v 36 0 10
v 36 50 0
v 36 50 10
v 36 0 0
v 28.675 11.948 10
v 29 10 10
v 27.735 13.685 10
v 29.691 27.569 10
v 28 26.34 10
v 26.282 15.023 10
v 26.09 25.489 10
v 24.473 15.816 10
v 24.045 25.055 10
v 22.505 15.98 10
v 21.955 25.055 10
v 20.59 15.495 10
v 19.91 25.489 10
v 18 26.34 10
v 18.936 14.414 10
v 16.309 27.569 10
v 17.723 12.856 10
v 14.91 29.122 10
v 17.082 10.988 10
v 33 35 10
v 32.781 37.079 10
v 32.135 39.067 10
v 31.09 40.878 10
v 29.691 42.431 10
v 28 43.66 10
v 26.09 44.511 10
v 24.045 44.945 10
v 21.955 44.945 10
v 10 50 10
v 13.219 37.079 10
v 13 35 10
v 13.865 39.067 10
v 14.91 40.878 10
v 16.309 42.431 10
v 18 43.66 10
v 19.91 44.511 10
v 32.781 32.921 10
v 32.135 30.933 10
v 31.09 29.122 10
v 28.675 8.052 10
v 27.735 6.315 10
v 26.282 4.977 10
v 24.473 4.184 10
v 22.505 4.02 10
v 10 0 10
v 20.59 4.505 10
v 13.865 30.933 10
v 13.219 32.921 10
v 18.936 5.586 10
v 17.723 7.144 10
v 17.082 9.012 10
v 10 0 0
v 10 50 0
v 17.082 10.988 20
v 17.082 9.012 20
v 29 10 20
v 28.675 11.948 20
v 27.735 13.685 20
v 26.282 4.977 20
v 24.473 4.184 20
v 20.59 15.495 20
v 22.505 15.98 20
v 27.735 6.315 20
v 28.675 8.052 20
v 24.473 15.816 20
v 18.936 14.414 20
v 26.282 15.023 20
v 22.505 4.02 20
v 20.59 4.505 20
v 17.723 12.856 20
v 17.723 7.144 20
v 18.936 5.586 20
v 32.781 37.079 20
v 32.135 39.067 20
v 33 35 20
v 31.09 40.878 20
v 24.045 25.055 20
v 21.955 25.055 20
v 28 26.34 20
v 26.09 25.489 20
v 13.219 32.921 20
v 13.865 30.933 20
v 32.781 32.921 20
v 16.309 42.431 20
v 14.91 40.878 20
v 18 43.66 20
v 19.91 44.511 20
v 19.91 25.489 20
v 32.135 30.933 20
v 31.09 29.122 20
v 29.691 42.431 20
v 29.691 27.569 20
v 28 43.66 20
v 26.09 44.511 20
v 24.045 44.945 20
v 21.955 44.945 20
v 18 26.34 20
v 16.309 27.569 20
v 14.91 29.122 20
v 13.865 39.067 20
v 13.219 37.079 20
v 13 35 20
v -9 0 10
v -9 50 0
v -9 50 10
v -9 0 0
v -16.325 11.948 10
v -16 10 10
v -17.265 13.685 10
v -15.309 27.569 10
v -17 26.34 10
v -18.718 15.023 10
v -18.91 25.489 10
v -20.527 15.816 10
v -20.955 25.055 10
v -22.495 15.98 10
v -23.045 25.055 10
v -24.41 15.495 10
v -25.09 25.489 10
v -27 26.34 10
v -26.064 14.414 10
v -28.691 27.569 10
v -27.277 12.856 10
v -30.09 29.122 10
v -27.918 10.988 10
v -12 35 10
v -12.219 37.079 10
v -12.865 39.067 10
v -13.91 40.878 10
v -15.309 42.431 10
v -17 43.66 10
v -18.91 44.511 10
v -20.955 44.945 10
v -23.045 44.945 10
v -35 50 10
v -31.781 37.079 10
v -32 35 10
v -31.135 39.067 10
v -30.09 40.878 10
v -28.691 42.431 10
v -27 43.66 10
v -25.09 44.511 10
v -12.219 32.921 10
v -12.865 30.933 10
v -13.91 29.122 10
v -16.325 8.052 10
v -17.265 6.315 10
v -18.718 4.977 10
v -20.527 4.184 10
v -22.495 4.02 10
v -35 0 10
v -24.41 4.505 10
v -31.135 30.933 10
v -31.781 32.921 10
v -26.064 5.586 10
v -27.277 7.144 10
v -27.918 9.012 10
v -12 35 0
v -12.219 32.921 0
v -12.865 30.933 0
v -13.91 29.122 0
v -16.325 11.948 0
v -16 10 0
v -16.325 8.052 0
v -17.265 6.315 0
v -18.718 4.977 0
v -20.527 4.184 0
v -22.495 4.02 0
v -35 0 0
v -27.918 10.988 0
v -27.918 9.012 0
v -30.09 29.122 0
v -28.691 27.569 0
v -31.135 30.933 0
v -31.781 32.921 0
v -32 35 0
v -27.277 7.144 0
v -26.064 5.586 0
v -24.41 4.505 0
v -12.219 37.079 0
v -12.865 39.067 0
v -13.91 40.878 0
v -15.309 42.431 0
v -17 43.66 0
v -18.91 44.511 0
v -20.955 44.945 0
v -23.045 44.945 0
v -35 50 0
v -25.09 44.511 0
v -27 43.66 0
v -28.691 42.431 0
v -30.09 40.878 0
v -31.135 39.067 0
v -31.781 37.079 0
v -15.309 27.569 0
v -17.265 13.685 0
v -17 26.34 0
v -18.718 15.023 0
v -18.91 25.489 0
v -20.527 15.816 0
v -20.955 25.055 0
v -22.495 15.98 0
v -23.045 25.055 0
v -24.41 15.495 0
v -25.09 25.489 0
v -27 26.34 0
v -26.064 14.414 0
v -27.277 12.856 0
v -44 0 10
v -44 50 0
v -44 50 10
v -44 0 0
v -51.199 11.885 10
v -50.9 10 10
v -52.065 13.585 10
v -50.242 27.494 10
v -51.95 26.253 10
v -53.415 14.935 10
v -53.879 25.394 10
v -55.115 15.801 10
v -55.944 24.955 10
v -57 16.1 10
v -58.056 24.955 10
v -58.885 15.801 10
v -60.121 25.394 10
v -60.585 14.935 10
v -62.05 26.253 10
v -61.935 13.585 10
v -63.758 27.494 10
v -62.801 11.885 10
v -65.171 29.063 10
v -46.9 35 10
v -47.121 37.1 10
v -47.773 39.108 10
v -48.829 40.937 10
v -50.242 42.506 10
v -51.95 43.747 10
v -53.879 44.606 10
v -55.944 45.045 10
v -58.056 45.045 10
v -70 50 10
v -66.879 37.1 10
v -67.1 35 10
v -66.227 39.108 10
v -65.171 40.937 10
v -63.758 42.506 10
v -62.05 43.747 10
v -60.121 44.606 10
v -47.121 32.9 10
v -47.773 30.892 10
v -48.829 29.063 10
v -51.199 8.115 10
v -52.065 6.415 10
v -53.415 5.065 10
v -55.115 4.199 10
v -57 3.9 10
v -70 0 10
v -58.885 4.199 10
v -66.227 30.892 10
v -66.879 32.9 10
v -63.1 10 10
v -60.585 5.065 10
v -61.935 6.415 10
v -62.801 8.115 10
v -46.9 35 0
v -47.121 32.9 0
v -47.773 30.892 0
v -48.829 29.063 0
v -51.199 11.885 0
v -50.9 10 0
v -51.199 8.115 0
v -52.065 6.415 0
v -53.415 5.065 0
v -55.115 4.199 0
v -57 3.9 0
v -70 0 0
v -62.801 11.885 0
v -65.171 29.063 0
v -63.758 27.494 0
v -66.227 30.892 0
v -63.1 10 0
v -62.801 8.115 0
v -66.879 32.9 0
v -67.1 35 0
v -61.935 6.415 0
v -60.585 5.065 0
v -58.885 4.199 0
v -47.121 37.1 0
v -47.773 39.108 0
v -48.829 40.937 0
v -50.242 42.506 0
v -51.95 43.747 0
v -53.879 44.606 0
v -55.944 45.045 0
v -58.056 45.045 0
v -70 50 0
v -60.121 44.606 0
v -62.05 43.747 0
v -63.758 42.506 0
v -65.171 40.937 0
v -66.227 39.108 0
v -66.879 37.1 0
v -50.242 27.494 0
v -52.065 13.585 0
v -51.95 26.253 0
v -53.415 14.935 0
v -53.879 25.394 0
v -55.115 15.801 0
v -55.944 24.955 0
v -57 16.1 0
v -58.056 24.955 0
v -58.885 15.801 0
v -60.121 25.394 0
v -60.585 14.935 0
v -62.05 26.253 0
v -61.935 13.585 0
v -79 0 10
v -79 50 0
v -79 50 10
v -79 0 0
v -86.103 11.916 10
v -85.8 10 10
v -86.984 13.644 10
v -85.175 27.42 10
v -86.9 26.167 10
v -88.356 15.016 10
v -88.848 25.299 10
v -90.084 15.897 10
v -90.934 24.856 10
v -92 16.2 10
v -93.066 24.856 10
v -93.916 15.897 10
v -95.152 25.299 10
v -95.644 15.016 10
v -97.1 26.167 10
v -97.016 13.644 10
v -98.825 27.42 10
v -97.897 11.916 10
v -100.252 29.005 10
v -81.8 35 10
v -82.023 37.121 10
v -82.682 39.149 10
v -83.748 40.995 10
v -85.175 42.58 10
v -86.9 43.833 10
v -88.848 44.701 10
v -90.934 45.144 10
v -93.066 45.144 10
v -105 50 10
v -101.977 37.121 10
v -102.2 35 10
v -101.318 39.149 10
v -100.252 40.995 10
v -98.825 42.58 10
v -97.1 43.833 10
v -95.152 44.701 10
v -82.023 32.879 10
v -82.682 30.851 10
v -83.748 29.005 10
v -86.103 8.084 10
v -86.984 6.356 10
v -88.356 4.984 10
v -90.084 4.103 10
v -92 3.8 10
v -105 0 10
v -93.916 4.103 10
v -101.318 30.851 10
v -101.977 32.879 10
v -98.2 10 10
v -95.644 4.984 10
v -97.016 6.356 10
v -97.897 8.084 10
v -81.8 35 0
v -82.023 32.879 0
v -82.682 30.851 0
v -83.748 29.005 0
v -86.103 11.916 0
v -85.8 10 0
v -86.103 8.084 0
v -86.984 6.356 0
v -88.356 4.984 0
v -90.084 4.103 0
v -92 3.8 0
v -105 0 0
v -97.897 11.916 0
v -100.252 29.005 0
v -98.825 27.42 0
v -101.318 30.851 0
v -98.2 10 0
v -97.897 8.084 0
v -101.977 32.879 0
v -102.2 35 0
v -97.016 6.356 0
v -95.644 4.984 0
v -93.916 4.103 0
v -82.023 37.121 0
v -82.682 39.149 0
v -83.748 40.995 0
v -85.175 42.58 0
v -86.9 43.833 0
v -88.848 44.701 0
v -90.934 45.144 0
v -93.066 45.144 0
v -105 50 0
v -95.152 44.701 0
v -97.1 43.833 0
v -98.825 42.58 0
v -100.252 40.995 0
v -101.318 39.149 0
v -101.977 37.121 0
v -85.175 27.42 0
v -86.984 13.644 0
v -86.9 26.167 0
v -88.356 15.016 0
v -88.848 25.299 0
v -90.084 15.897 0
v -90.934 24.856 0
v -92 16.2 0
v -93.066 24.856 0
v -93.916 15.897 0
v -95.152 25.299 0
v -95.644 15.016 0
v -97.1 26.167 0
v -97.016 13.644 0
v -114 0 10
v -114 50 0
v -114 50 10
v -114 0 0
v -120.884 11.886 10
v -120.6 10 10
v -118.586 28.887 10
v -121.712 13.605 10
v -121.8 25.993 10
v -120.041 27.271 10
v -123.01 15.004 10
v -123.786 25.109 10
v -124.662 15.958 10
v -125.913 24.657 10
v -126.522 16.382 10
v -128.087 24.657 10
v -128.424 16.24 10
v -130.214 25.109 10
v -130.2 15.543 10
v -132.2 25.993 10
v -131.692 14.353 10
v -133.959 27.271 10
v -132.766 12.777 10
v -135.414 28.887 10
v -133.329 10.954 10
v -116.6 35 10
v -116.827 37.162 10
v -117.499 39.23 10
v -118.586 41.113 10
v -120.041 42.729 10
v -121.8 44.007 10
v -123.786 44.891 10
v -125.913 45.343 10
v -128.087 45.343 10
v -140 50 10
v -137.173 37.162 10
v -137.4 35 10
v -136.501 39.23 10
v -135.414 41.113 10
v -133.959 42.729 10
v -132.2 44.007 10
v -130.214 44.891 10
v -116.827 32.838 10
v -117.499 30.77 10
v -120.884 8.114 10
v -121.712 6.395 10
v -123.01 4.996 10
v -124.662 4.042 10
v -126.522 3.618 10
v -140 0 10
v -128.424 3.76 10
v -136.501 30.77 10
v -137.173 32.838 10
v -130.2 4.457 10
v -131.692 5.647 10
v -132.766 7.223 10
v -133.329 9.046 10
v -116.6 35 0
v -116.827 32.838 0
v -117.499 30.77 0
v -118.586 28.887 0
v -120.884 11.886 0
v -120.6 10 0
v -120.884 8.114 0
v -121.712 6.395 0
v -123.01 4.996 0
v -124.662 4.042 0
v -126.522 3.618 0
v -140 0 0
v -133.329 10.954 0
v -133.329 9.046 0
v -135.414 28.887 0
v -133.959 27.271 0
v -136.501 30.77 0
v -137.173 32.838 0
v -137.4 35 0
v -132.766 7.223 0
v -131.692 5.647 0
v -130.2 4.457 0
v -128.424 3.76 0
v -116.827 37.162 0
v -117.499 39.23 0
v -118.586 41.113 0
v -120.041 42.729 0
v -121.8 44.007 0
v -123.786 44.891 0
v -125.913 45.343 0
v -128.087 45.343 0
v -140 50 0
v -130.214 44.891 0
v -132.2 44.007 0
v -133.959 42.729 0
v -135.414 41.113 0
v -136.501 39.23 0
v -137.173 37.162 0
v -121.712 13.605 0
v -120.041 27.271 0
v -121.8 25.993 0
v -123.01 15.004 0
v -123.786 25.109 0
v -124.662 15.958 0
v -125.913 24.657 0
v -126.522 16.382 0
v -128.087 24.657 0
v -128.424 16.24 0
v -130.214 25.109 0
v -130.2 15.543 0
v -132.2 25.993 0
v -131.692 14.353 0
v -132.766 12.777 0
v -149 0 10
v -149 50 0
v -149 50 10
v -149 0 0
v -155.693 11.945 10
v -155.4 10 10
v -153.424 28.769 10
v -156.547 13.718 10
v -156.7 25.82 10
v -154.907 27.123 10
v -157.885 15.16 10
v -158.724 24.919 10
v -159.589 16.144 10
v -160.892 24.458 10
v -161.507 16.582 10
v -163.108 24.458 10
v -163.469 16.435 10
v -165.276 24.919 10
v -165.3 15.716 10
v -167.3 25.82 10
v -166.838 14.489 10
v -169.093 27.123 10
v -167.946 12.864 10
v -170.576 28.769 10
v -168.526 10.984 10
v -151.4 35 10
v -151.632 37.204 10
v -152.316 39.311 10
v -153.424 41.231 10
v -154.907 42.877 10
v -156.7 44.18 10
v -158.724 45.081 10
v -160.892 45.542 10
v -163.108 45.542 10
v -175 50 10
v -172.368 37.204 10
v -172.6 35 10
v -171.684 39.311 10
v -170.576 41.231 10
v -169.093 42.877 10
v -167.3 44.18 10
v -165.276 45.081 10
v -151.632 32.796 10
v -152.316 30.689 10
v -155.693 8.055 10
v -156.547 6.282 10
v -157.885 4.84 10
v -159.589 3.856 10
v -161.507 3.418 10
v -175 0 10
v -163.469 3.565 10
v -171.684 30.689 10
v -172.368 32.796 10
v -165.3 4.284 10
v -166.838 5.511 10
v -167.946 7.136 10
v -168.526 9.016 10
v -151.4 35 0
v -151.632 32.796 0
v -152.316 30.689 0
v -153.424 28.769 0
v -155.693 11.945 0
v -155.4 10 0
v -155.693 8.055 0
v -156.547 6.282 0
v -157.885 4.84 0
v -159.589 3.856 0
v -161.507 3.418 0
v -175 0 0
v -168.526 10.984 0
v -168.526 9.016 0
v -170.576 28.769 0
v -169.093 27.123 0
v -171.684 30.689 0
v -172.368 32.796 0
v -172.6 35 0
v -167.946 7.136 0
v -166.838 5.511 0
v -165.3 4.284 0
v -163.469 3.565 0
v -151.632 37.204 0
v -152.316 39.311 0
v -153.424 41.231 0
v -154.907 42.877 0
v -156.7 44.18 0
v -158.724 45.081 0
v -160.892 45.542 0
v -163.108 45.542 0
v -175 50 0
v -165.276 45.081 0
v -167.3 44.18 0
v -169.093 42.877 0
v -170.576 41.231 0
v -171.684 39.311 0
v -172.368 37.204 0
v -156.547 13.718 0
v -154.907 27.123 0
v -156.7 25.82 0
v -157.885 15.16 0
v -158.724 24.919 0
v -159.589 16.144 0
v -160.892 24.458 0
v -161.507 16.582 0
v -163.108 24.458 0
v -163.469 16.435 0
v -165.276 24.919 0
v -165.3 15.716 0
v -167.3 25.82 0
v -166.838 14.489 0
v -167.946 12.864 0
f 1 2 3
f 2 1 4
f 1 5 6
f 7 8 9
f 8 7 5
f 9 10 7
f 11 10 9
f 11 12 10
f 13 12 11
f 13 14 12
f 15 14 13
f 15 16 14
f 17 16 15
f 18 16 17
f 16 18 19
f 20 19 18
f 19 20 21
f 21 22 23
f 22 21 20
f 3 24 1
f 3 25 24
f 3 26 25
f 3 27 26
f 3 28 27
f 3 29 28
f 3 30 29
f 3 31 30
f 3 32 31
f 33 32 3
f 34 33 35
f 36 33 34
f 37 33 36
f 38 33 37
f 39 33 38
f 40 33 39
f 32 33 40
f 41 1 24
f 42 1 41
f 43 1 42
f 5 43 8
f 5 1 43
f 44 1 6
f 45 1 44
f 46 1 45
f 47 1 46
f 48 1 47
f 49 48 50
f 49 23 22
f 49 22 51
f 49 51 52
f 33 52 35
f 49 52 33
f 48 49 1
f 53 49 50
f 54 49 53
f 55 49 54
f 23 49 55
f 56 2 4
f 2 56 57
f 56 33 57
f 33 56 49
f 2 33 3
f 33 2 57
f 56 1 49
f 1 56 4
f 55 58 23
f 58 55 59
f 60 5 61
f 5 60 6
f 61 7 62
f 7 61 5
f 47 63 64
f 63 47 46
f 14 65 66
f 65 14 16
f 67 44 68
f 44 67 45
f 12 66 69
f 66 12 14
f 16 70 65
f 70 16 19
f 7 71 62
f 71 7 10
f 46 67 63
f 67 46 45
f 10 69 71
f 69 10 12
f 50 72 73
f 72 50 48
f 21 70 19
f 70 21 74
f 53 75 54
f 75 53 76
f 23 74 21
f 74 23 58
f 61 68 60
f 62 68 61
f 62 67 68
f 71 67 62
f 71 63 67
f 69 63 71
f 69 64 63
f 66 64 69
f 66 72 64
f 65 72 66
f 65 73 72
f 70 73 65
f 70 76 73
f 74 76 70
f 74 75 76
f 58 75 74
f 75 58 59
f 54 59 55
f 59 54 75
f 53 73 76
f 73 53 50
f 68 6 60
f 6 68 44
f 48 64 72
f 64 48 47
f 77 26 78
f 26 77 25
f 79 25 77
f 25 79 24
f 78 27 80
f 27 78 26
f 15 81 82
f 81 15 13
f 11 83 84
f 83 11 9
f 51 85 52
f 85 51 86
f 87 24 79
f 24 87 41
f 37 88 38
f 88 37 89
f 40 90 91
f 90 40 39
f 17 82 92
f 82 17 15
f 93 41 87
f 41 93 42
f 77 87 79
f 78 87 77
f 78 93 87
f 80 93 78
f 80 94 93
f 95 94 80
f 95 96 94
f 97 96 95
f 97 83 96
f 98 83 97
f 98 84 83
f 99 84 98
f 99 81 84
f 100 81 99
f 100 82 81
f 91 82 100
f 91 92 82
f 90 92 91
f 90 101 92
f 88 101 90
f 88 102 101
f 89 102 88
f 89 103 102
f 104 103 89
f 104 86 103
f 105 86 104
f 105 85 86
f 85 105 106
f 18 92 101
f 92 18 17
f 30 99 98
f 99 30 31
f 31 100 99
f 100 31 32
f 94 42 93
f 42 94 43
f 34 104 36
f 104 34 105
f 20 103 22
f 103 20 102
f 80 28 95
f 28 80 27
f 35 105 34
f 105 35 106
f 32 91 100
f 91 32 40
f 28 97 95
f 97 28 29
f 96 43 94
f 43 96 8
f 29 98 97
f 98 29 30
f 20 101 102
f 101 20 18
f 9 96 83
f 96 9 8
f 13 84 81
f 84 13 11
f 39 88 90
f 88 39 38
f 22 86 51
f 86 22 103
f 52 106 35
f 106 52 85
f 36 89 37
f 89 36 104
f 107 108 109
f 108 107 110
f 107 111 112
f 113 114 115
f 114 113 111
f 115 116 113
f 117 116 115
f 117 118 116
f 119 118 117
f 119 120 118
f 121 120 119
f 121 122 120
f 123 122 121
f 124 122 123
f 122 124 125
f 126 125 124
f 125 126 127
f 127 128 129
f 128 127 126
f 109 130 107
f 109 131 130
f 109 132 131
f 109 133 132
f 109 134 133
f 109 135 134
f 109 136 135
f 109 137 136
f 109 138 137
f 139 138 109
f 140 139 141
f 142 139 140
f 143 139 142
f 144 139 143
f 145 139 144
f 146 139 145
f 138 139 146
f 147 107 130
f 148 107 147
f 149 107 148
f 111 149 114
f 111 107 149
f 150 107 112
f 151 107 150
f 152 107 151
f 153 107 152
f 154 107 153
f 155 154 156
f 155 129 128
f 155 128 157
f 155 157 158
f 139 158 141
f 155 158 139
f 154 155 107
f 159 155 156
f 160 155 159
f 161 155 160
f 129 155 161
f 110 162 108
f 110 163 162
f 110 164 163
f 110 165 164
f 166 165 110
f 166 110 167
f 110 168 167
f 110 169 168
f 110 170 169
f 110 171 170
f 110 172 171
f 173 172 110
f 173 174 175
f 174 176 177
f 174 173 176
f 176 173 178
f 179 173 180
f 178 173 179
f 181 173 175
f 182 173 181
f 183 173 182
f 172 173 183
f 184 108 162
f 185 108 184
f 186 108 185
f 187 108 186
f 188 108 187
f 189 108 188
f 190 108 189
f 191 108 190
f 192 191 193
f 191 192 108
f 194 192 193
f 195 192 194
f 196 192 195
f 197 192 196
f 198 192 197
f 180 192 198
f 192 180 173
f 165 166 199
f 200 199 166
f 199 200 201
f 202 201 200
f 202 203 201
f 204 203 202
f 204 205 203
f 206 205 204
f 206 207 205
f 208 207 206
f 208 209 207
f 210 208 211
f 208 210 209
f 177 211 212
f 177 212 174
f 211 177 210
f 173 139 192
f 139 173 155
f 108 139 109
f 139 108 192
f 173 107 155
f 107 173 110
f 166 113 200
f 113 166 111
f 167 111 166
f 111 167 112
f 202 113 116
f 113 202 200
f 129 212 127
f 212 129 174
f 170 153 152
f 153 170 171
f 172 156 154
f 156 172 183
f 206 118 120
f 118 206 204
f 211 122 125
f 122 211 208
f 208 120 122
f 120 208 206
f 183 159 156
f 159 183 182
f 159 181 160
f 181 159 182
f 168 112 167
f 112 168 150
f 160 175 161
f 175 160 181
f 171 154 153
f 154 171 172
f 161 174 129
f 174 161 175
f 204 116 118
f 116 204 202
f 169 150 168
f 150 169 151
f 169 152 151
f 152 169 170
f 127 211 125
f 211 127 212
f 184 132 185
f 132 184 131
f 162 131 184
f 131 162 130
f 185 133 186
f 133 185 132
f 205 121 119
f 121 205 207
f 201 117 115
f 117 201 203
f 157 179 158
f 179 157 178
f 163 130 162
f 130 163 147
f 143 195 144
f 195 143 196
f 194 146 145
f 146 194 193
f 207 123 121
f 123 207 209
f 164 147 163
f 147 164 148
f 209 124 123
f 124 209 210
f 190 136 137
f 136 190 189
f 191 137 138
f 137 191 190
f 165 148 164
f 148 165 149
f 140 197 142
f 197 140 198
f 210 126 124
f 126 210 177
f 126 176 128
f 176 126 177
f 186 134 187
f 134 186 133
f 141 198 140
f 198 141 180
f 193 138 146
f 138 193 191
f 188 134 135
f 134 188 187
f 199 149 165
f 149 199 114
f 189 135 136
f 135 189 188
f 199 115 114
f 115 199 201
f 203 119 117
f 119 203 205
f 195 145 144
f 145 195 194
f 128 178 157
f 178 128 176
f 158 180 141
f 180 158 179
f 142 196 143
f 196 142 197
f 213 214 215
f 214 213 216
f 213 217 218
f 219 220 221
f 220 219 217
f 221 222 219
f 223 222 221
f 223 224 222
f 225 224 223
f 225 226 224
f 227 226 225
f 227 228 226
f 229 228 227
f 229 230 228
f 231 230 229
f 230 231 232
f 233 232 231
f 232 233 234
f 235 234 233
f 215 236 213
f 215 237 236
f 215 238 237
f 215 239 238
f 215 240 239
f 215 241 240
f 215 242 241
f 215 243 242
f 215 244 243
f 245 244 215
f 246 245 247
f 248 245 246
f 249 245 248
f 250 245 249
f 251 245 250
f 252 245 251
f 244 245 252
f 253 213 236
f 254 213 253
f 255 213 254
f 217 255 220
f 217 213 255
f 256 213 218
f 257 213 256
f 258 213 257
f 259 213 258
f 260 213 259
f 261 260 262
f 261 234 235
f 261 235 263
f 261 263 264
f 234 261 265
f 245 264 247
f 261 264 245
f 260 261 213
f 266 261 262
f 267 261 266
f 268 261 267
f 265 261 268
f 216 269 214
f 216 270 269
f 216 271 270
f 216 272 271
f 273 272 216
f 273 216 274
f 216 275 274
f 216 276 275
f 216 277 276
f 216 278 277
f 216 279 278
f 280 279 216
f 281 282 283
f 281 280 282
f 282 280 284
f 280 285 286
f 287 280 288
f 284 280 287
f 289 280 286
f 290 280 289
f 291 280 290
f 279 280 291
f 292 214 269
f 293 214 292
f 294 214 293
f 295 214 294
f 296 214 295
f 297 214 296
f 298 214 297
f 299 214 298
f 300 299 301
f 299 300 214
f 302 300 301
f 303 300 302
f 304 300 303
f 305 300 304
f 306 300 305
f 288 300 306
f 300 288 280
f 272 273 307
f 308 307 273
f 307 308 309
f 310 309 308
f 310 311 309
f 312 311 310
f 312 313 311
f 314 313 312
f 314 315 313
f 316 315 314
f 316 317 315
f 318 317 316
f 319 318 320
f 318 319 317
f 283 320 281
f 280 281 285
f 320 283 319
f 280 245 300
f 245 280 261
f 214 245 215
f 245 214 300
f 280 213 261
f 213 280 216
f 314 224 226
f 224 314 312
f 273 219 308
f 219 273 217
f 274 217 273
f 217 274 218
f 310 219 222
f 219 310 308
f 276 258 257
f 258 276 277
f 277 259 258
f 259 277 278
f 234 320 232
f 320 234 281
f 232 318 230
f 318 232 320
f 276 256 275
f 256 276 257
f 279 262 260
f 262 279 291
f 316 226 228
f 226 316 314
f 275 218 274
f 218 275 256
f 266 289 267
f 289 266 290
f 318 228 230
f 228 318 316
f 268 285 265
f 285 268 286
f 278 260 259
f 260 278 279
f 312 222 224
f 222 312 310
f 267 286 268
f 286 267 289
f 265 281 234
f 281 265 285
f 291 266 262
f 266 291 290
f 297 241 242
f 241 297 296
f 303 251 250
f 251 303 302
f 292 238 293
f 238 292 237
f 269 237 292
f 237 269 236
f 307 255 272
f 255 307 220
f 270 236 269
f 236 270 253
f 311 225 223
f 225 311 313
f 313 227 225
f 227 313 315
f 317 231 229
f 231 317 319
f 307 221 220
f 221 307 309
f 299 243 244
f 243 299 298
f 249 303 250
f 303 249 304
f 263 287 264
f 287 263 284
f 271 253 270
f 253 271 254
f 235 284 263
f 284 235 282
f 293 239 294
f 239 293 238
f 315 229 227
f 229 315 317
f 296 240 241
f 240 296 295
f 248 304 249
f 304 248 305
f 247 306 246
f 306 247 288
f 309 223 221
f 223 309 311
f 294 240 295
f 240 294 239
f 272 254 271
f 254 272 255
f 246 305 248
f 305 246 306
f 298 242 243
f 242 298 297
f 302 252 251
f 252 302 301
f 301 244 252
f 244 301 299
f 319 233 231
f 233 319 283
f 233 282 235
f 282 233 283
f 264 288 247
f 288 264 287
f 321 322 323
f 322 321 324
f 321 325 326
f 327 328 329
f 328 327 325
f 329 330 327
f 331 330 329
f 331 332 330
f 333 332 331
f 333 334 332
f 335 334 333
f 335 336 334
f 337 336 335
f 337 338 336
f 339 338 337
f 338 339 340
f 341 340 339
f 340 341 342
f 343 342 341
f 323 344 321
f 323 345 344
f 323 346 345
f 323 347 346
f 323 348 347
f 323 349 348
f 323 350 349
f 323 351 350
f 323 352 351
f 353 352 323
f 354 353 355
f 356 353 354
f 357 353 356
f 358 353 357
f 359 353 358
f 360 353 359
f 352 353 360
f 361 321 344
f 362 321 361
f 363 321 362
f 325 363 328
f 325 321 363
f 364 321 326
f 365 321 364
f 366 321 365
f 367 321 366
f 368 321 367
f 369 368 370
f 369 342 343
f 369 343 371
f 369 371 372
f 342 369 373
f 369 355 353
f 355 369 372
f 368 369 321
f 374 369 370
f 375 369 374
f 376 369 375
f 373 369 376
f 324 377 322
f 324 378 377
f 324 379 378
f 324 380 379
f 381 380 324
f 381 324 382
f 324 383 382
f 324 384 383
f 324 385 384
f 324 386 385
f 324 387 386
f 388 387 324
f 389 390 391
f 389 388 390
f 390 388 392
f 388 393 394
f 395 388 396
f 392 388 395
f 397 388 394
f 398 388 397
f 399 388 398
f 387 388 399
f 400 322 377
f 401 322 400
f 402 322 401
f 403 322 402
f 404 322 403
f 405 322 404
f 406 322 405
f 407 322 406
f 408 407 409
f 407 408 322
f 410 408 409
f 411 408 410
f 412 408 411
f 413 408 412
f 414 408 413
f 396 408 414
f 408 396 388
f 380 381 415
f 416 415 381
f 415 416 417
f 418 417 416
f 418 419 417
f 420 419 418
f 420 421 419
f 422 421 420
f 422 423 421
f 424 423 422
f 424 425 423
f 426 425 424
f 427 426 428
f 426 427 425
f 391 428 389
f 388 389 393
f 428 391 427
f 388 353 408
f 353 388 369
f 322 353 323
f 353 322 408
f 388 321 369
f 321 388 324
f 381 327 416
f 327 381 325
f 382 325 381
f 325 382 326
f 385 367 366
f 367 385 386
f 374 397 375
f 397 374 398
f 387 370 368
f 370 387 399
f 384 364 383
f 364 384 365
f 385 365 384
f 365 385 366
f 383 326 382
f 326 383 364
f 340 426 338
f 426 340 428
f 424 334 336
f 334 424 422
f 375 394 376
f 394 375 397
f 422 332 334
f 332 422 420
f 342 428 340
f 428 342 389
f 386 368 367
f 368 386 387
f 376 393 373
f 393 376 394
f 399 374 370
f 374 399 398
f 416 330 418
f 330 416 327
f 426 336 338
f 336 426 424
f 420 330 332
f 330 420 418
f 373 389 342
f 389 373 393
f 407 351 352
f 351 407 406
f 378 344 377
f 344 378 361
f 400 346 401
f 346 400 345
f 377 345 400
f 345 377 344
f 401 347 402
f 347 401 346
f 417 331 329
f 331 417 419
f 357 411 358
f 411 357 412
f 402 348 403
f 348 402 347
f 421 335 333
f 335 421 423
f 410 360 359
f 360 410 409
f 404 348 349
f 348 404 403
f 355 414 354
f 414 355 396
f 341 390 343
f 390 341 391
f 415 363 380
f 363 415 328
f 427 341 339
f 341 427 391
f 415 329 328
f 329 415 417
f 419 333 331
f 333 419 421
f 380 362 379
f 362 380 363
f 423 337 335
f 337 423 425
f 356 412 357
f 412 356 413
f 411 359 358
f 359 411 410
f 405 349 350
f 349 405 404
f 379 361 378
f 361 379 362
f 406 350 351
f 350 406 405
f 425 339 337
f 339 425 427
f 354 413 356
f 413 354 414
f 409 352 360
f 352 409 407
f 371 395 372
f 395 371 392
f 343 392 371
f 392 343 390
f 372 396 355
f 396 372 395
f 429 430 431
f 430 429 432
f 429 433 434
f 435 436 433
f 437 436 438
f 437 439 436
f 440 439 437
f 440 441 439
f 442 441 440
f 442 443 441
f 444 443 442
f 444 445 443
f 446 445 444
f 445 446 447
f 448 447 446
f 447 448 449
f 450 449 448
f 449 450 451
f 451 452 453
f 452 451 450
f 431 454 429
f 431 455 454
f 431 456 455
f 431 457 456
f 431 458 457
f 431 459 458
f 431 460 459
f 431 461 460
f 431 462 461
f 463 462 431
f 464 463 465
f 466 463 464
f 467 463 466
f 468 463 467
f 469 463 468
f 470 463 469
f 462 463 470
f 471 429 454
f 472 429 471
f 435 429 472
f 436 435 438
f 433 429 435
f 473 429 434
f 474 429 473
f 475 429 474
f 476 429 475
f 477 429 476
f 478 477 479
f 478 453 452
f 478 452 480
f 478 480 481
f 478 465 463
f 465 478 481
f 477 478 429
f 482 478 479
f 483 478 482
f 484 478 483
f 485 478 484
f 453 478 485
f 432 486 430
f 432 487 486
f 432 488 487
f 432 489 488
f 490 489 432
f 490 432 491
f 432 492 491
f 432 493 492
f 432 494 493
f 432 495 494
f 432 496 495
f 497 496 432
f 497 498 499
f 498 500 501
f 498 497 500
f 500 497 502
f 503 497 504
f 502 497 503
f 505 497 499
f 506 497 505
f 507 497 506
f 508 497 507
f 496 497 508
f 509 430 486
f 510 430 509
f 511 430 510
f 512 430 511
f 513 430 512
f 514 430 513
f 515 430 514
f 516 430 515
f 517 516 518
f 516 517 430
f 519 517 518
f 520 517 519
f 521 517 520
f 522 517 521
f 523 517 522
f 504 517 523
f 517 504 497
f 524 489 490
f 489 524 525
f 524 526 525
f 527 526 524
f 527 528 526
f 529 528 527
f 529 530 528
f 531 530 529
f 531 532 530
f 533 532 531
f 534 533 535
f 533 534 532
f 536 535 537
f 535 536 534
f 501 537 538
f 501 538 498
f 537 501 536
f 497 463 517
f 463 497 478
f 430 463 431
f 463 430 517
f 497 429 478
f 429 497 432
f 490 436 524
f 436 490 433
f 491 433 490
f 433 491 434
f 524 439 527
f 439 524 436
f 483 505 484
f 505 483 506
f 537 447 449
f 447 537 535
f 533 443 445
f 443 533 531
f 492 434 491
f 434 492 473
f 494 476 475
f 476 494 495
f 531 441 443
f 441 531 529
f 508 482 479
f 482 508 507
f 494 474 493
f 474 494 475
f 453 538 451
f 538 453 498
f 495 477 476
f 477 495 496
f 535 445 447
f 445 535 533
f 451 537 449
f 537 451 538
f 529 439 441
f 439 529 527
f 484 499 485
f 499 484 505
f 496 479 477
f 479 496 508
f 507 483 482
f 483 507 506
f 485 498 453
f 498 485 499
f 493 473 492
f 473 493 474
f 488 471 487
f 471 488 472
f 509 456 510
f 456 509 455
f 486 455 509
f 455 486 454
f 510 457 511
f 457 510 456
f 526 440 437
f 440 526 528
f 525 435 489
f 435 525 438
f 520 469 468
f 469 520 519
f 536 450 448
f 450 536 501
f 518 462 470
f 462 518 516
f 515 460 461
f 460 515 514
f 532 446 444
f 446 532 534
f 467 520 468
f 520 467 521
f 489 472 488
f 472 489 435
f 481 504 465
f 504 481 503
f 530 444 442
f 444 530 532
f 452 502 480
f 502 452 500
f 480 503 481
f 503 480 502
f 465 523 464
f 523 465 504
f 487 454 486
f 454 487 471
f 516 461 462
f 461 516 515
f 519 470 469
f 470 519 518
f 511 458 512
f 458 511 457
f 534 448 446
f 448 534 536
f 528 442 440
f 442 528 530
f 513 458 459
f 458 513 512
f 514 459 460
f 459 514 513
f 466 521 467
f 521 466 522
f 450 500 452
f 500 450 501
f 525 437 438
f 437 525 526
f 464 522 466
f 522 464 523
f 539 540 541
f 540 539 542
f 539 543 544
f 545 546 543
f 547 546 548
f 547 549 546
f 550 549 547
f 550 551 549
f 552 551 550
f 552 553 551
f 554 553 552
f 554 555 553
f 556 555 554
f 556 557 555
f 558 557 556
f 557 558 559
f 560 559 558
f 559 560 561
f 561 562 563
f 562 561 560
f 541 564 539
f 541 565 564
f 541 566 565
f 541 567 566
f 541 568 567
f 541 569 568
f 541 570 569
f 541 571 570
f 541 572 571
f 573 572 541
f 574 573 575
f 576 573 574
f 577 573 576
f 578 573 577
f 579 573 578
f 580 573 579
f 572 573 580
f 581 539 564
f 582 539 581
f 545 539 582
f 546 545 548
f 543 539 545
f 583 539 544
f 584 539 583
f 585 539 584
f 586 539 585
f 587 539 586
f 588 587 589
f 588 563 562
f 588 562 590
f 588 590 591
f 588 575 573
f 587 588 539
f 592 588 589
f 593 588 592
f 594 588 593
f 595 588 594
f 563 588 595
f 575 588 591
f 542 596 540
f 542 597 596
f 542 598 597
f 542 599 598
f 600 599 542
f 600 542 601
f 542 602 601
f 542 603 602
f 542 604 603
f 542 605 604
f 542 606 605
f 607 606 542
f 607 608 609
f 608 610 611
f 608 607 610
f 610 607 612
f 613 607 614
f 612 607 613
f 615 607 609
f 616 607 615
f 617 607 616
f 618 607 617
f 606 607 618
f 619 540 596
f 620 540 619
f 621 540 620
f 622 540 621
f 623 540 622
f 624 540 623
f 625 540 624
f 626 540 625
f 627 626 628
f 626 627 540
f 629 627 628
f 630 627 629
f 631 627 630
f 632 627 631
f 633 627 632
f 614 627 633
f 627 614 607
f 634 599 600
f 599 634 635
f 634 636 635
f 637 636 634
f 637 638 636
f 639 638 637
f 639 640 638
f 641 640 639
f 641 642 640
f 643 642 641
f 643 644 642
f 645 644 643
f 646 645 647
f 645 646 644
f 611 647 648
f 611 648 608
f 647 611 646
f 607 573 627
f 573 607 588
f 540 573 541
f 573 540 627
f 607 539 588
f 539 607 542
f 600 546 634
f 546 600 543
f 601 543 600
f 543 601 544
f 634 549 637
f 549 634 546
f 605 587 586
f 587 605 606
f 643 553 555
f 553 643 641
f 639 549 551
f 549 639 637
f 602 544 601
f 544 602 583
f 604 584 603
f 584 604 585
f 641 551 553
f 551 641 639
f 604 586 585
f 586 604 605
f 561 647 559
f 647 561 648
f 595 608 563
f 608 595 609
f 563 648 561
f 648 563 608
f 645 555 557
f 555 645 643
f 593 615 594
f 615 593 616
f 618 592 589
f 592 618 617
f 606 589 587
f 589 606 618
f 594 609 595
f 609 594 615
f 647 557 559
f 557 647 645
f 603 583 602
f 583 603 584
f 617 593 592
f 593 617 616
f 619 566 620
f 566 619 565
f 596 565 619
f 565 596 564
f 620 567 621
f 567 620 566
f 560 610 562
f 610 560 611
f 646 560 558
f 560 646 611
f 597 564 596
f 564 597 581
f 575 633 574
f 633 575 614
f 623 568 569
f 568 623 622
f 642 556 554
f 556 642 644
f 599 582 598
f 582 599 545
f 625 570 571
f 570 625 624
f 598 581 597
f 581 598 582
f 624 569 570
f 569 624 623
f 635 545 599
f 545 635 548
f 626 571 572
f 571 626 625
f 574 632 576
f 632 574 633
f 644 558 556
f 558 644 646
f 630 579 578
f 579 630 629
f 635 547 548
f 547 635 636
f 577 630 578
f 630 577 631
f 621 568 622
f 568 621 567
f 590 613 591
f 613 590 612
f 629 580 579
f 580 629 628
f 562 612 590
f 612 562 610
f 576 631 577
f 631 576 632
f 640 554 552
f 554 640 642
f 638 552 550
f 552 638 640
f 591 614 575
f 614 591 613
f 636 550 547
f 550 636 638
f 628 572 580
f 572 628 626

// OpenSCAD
translate([10, 0, 0]) union() {
  cube([26, 50, 10]);
  translate([13, 10, 0]) cylinder(20, 6, 6);
  translate([13, 35, 0]) cylinder(20, 10, 10);
}

translate([-35, 0, 0]) difference() {
  cube([26, 50, 10]);
  translate([13, 10, -1]) cylinder(20, 6, 6);
  translate([13, 35, -1]) cylinder(20, 10, 10);
}

translate([-70, 0, 0]) difference() {
  cube([26, 50, 10]);
  translate([13, 10, -1]) cylinder(20, 6.1, 6.1);
  translate([13, 35, -1]) cylinder(20, 10.1, 10.1);
}

translate([-105, 0, 0]) difference() {
  cube([26, 50, 10]);
  translate([13, 10, -1]) cylinder(20, 6.2, 6.2);
  translate([13, 35, -1]) cylinder(20, 10.2, 10.2);
}

translate([-140, 0, 0]) difference() {
  cube([26, 50, 10]);
  translate([13, 10, -1]) cylinder(20, 6.4, 6.4);
  translate([13, 35, -1]) cylinder(20, 10.4, 10.4);
}

translate([-175, 0, 0]) difference() {
  cube([26, 50, 10]);
  translate([13, 10, -1]) cylinder(20, 6.6, 6.6);
  translate([13, 35, -1]) cylinder(20, 10.6, 10.6);
}
